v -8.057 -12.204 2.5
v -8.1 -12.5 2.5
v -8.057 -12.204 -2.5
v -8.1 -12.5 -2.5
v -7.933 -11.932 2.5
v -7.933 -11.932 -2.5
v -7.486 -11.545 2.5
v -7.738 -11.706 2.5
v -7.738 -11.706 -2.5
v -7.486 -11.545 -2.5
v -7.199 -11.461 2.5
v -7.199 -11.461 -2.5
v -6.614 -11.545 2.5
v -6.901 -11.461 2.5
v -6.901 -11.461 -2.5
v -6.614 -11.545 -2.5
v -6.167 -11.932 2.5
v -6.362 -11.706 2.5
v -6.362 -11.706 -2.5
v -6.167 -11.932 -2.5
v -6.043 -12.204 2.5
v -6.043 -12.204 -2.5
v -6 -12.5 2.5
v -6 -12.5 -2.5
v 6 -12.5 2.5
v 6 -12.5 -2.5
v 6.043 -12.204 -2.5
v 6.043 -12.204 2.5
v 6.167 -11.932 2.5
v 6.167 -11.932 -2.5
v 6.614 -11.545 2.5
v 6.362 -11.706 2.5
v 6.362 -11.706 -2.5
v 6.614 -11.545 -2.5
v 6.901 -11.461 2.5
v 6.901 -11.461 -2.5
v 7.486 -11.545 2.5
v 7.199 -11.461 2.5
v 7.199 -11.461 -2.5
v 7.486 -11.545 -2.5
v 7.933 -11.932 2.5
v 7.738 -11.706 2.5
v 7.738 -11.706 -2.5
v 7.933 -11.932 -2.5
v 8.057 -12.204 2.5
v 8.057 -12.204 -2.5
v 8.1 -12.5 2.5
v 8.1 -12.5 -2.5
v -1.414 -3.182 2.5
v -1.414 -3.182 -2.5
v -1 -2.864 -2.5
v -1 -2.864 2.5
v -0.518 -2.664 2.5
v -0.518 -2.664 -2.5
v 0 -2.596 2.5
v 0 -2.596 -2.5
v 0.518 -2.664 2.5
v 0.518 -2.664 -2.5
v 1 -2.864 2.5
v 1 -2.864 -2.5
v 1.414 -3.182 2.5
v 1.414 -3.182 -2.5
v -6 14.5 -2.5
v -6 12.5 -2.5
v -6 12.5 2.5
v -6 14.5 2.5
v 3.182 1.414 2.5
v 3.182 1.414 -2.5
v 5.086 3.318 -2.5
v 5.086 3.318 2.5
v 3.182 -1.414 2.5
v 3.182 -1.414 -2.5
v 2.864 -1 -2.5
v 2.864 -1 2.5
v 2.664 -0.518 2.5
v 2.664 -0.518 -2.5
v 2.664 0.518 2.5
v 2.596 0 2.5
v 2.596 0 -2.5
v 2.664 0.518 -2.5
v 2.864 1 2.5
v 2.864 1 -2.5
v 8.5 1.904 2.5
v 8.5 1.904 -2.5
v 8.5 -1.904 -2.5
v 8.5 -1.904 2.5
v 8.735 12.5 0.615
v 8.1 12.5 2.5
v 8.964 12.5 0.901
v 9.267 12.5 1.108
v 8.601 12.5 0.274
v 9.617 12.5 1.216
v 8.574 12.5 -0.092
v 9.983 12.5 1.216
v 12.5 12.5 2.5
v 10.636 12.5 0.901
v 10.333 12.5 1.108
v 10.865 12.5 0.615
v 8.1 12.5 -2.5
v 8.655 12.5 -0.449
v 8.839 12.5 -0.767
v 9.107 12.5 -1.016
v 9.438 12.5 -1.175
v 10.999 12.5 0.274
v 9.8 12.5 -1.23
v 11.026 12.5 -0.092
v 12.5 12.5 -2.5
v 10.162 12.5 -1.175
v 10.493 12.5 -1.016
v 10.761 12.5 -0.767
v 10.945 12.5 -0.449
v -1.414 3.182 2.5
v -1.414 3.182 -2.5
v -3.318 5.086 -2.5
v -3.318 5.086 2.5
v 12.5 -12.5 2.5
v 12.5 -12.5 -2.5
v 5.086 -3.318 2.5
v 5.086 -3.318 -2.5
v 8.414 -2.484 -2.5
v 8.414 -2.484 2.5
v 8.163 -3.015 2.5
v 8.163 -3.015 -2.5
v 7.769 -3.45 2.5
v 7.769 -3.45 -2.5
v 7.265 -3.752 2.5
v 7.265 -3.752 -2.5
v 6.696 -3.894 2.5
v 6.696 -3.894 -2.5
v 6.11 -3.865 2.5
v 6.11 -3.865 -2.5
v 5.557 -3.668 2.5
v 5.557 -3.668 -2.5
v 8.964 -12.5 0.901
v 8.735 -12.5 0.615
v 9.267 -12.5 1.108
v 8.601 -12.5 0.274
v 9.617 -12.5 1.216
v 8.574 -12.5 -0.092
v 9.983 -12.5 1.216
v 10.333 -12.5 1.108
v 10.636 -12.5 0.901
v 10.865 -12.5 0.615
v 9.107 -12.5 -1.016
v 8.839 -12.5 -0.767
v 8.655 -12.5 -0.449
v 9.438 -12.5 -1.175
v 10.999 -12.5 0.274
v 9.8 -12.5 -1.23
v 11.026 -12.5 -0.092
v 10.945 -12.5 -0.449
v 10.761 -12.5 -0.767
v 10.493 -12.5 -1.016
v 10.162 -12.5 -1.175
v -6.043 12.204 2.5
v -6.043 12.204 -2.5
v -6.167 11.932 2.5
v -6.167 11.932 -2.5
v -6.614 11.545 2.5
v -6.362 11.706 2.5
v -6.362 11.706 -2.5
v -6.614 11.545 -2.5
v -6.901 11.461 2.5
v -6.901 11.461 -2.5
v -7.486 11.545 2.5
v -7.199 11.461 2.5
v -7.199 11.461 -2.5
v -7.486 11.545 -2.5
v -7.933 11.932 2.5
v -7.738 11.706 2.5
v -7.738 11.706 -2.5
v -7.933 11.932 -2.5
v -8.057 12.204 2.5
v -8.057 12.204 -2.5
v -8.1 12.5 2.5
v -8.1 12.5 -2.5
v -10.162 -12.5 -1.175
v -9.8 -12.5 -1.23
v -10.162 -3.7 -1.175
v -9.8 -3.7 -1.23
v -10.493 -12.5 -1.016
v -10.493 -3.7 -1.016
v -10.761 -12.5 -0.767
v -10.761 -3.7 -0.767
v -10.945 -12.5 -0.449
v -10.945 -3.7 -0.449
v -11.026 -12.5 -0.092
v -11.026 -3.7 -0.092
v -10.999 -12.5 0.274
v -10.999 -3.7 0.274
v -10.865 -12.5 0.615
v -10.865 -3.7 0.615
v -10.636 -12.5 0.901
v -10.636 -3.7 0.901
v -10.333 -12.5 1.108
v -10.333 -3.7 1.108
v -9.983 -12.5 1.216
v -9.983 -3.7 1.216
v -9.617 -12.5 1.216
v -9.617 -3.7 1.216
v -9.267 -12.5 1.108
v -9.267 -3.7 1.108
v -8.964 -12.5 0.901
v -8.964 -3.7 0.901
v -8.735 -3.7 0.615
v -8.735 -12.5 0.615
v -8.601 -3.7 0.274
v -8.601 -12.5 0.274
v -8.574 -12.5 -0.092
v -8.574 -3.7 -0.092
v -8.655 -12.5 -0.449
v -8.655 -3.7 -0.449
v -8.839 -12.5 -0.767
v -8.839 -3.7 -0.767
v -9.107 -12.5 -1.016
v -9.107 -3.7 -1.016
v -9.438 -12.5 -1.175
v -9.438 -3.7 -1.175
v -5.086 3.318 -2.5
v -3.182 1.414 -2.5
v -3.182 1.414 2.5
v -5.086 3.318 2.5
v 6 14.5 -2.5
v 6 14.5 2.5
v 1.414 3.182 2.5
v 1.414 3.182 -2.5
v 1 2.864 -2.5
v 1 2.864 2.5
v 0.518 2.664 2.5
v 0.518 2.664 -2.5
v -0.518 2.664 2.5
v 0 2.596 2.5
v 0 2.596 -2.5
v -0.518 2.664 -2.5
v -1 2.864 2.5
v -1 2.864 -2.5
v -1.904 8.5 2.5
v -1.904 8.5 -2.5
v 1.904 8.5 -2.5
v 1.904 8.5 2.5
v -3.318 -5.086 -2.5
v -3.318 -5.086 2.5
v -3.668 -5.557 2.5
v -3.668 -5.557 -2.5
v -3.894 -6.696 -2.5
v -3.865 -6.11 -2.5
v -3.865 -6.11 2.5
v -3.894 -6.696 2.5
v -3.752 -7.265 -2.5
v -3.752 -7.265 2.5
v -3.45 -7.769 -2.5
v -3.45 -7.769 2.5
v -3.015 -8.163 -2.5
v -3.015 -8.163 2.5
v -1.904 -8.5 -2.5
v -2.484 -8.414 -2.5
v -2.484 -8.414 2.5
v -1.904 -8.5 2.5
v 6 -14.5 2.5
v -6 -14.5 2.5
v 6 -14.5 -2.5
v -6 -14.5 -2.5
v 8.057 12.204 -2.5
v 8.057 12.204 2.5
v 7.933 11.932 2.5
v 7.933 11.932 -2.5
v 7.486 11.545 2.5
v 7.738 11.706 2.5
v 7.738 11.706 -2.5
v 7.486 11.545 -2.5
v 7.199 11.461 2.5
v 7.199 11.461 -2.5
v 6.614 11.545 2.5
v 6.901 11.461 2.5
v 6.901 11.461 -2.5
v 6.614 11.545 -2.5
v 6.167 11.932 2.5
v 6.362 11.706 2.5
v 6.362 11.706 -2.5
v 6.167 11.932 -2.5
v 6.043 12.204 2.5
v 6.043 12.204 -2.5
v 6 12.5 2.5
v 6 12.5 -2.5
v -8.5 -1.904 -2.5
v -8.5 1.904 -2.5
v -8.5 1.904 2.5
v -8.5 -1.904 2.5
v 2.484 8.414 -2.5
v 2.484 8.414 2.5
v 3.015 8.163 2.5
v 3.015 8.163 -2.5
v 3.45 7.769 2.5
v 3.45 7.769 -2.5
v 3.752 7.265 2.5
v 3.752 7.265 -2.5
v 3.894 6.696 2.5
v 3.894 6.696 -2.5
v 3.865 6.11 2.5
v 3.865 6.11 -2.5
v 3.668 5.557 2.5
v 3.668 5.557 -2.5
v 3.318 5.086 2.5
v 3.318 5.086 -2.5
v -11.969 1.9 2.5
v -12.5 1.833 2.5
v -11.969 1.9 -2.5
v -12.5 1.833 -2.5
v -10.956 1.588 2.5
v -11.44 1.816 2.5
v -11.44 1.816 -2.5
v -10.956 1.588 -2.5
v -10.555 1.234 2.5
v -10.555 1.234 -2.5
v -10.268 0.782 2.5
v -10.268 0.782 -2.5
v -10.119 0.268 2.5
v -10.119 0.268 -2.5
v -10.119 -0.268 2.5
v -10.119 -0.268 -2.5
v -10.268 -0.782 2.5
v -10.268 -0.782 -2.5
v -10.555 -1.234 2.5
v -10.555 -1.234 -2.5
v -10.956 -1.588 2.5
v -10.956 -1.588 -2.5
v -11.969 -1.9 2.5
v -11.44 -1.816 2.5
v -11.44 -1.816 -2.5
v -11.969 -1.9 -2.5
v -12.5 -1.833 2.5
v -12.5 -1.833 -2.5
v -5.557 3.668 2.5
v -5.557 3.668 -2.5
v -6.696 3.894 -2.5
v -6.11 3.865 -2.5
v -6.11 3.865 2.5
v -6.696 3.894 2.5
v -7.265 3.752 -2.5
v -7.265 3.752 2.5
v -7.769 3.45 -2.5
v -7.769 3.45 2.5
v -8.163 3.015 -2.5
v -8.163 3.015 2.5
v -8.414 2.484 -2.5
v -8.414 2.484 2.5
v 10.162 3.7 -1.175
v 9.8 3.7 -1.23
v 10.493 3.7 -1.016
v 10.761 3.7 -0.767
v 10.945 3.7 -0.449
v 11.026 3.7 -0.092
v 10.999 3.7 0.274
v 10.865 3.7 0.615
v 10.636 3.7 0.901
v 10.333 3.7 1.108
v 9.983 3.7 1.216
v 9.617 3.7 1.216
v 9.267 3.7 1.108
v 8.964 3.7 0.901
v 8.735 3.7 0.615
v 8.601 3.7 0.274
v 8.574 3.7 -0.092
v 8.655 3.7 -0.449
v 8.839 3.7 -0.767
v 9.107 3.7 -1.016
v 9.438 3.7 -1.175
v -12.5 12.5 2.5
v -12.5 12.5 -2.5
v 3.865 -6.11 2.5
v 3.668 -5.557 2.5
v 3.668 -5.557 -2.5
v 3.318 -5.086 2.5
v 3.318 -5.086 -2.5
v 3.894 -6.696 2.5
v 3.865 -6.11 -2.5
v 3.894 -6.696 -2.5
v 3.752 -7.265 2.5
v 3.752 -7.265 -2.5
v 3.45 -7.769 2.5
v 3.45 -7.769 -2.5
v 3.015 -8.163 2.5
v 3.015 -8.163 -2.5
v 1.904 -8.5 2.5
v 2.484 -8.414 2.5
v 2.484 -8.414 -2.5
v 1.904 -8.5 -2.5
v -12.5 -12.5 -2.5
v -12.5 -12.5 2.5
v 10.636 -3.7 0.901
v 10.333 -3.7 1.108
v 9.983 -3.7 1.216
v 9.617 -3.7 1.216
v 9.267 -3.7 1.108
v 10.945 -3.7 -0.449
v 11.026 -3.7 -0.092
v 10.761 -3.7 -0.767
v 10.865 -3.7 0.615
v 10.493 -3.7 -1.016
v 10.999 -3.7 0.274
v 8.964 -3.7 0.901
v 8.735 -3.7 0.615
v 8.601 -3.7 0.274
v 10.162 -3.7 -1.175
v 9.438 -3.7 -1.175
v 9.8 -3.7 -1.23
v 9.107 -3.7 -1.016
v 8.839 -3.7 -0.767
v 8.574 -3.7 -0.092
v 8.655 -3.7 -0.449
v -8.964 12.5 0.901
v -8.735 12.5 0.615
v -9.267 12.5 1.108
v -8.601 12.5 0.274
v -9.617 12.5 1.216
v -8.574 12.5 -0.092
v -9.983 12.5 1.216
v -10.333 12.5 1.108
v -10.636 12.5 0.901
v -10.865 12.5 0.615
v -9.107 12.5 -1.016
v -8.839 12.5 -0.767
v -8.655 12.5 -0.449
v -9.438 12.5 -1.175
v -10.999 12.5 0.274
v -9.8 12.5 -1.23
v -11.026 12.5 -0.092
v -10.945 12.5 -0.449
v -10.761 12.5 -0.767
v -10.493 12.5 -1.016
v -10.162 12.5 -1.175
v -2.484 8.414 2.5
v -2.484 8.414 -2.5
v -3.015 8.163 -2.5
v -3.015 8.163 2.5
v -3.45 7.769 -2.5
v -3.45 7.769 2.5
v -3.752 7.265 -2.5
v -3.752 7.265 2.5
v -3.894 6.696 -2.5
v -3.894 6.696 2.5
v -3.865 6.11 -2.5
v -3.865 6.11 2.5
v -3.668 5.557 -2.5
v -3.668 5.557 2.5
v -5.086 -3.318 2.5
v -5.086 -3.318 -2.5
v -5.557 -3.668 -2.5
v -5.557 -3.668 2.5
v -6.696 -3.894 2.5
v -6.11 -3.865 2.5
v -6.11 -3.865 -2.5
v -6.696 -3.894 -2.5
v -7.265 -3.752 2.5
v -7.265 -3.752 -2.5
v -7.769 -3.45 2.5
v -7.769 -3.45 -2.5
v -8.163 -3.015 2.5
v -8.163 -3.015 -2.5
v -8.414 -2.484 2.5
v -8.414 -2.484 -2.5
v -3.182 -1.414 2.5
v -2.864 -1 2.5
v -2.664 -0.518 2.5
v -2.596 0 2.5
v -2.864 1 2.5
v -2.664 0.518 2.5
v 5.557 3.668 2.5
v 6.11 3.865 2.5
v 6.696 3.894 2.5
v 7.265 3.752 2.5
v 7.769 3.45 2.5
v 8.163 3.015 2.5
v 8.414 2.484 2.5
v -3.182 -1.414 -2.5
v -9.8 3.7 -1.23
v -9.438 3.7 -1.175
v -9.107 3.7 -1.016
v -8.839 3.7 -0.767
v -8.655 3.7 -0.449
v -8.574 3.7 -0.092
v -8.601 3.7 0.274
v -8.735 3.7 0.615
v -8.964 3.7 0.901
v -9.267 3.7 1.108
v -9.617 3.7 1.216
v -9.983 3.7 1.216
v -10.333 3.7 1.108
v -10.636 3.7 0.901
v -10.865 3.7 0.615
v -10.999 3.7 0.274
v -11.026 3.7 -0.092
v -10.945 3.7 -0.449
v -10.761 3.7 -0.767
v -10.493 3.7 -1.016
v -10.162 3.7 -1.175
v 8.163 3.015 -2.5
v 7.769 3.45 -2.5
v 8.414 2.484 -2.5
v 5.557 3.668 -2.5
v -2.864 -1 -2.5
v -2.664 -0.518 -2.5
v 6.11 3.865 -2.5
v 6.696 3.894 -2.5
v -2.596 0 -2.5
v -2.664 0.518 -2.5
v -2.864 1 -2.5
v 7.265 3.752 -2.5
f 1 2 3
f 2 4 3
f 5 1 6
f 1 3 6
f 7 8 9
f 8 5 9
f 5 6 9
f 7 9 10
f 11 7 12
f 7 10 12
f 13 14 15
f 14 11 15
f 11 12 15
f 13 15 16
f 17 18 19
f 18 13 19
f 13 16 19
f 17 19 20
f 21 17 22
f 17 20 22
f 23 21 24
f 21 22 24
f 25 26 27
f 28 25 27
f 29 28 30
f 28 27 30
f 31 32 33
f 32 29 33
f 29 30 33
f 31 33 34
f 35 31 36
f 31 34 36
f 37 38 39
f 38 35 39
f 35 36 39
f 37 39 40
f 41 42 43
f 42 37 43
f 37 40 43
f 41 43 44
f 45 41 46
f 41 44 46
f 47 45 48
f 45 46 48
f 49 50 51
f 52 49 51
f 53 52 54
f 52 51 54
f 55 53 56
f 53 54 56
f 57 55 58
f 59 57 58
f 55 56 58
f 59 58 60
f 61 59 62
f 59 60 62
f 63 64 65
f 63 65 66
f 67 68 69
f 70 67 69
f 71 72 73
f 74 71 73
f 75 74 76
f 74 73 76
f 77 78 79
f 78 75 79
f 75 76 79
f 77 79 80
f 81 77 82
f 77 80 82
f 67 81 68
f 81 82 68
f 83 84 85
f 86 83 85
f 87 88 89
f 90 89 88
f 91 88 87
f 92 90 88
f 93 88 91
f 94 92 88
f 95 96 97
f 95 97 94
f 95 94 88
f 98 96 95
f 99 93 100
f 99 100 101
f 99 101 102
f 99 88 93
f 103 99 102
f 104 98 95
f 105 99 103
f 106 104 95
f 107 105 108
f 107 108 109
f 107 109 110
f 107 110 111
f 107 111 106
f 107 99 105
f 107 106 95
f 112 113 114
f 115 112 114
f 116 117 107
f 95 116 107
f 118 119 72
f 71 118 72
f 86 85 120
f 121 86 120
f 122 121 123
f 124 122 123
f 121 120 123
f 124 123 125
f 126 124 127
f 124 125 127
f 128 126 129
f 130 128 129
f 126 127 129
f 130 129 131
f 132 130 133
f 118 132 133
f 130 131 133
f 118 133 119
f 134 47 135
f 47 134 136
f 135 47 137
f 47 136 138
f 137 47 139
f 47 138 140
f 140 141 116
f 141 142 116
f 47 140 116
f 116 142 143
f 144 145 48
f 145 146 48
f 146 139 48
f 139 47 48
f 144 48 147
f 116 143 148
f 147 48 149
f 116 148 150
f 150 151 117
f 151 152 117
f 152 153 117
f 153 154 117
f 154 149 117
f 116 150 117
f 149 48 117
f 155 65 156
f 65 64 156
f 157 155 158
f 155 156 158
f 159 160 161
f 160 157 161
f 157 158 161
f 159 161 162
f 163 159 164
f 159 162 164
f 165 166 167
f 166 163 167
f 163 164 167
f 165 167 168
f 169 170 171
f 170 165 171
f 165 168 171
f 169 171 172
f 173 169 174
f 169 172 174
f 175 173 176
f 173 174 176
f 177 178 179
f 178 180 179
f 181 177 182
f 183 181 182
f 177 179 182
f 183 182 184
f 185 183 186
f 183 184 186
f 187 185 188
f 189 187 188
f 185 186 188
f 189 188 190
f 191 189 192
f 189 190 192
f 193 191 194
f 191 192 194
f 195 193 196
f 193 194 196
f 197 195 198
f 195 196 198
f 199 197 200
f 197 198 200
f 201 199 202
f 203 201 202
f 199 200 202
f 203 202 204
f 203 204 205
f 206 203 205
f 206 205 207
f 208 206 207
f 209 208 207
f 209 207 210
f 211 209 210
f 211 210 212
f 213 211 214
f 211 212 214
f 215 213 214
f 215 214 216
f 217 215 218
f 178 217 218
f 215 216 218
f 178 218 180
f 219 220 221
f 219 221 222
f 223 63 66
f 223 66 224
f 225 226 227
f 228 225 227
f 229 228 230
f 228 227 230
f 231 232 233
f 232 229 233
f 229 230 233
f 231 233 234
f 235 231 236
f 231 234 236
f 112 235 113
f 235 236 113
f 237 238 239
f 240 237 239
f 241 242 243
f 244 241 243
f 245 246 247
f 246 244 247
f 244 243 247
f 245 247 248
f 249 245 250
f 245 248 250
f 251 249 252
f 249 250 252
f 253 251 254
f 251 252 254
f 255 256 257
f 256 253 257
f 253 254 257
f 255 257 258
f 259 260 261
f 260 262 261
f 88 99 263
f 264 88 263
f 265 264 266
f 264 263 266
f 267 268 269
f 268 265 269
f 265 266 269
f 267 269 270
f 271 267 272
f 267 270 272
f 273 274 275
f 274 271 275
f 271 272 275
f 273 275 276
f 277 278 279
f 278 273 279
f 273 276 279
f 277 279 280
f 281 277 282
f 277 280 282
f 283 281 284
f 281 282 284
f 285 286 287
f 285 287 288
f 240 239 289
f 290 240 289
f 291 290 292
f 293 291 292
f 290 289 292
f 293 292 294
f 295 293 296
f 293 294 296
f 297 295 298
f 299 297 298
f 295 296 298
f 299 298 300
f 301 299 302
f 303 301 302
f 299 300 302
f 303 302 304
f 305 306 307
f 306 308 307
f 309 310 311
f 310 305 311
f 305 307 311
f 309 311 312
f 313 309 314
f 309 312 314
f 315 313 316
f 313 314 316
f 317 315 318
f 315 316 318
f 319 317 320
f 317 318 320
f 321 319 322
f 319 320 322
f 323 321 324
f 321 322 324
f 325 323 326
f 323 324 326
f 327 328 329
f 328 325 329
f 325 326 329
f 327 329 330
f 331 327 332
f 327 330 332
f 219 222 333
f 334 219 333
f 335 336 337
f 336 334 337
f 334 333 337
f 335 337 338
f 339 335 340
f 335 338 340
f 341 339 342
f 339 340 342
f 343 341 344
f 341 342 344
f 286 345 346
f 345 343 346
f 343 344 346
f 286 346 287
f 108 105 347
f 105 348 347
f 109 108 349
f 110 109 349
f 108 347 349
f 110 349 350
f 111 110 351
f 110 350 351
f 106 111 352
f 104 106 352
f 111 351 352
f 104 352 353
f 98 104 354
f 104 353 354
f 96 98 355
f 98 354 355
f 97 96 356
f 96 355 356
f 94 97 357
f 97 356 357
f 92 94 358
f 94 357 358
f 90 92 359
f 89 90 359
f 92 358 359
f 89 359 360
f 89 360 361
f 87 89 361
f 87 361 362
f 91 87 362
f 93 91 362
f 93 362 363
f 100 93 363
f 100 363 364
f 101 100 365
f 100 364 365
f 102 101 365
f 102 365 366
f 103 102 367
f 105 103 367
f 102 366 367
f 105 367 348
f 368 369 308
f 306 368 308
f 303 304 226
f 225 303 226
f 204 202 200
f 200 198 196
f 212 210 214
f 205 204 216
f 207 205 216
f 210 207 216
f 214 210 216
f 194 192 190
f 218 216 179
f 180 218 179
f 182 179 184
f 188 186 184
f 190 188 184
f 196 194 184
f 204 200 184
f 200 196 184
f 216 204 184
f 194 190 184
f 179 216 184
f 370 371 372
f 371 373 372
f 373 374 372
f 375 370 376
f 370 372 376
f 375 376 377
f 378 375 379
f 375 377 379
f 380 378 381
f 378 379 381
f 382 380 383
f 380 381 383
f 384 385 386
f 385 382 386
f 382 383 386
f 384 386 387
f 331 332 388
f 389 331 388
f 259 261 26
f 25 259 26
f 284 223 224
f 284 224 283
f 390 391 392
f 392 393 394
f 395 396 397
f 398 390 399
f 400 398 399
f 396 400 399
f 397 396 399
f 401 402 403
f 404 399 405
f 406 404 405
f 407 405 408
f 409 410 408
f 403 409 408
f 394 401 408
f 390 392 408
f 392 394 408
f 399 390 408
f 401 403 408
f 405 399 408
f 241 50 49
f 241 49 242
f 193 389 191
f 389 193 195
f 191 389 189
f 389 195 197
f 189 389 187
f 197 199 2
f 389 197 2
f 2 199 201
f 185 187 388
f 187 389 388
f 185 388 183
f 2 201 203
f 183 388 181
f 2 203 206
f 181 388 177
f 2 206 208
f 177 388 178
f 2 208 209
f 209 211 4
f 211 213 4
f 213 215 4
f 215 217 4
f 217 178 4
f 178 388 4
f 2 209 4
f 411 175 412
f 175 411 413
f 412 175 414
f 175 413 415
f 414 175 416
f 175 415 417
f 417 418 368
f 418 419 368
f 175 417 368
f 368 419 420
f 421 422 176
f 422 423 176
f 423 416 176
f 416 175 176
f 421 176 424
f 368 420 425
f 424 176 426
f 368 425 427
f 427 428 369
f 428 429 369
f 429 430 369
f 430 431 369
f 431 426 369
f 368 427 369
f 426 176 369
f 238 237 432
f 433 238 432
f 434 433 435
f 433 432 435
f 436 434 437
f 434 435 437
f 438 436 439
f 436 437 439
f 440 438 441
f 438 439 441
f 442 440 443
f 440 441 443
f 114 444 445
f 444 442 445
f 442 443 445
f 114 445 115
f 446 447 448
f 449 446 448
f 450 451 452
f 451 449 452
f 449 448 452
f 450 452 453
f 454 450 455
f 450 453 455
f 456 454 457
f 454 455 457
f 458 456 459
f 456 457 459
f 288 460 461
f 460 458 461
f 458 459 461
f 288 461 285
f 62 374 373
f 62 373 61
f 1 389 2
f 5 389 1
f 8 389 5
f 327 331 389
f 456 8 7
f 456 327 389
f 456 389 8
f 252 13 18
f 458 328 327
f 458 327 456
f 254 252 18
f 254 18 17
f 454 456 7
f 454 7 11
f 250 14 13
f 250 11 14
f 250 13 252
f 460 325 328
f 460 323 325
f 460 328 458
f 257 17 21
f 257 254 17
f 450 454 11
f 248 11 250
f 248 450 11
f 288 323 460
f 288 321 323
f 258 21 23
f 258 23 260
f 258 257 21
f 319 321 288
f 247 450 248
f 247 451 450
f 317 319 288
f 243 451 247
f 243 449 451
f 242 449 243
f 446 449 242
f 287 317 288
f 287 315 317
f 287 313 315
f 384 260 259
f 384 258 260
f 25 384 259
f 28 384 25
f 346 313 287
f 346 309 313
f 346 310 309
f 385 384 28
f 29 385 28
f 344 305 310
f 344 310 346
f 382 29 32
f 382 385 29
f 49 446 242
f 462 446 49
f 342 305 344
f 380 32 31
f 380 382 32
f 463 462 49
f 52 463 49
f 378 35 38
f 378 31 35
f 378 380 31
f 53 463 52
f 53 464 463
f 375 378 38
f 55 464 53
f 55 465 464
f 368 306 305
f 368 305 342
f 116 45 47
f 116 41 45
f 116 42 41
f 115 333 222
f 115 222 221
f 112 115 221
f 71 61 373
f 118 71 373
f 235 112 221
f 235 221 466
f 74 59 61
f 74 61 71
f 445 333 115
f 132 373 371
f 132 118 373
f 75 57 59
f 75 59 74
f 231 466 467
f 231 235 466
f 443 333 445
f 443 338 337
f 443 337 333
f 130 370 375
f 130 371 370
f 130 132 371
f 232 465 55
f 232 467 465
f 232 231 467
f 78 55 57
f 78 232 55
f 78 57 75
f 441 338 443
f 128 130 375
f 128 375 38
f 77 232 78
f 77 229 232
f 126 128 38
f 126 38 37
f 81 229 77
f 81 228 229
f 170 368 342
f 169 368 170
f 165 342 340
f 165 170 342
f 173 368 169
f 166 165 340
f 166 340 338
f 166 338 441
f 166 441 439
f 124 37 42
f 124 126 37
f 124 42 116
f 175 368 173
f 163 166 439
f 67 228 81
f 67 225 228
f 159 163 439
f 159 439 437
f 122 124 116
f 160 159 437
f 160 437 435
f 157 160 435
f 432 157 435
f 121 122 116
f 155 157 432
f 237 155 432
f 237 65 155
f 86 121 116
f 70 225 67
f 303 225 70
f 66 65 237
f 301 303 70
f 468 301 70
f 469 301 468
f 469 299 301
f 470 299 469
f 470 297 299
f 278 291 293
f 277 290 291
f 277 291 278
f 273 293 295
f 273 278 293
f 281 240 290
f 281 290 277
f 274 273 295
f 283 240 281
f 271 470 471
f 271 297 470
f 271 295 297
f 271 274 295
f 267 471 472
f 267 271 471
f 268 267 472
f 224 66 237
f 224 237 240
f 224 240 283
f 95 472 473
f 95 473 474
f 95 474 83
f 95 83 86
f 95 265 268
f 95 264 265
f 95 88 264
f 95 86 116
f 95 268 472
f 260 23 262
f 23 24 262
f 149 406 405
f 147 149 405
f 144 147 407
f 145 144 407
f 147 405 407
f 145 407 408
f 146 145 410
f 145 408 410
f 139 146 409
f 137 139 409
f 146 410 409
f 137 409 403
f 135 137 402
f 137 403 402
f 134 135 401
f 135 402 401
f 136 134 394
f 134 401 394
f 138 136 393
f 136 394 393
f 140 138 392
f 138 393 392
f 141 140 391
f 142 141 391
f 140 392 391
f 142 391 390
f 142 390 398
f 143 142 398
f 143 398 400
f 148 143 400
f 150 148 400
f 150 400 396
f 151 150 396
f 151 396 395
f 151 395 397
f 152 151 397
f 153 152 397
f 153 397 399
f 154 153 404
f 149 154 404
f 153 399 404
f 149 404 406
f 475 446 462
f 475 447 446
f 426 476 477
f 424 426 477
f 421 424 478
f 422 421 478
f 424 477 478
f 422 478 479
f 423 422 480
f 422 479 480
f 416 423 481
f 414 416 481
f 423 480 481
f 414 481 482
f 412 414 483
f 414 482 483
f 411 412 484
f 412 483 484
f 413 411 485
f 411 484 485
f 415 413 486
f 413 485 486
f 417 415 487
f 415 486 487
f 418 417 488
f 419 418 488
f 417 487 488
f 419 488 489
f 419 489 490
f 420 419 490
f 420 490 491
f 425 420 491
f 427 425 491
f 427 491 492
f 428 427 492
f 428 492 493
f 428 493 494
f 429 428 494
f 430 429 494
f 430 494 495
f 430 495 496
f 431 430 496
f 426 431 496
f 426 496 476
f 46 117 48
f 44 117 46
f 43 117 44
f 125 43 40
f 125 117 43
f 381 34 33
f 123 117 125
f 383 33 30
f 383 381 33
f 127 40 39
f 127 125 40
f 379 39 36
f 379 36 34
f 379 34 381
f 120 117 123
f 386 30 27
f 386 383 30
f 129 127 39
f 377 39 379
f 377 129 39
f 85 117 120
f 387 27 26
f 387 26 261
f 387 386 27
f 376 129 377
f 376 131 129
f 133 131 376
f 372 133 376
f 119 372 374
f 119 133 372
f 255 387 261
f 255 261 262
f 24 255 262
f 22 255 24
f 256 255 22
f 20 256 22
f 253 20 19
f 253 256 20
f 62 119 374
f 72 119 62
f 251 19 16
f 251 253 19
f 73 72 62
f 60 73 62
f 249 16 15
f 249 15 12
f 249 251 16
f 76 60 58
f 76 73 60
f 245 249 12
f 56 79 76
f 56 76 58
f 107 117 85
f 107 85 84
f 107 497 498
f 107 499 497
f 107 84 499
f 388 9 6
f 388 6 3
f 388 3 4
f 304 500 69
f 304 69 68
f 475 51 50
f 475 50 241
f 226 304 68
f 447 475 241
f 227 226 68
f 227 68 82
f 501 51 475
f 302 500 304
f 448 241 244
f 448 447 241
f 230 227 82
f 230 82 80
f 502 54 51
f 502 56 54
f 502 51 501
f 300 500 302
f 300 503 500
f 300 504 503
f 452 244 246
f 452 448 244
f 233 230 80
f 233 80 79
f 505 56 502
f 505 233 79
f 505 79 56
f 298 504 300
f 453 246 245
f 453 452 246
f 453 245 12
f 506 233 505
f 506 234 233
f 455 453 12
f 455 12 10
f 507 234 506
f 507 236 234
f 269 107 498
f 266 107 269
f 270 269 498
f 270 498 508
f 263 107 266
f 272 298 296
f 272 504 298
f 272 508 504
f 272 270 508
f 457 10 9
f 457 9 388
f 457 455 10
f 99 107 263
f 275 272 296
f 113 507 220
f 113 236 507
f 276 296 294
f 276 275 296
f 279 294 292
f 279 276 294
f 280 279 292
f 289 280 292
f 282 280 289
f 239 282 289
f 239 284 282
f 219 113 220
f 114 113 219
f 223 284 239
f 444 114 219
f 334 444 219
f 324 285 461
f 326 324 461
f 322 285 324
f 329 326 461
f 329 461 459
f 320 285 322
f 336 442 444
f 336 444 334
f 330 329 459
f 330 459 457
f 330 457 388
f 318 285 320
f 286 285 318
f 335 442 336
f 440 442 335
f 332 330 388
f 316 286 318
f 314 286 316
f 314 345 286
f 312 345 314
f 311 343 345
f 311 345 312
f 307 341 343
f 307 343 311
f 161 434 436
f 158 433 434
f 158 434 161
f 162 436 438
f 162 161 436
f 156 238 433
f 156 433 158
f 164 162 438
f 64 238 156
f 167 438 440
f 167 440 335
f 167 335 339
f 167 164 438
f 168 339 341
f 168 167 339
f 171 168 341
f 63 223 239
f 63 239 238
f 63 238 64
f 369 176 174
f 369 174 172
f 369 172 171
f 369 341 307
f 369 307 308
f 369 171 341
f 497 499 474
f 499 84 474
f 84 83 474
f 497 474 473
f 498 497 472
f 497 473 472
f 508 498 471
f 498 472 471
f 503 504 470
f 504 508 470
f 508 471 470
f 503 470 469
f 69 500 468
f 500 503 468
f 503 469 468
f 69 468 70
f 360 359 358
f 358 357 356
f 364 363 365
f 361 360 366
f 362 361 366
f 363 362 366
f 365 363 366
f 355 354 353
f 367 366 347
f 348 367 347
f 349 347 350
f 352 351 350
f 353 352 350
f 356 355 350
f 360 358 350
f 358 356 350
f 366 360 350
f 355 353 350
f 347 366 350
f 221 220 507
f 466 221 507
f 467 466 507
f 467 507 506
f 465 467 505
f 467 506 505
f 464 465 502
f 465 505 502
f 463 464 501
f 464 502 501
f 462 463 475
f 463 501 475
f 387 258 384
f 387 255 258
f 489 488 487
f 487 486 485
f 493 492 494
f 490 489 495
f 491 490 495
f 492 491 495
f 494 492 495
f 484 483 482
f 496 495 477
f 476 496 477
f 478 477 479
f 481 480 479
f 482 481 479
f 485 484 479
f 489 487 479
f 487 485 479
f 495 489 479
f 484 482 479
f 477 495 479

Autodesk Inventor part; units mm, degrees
ref_plane "YZ Plane" through (0, 0, 0) normal (1, 0, 0) x (0, 1, 0)
ref_plane "XZ Plane" through (0, 0, 0) normal (0, 1, 0) x (-1, 0, 0)
ref_plane "XY Plane" through (0, 0, 0) normal (0, 0, 1) x (1, 0, 0)
sketch "スケッチ1" plane through (0, 0, 0) normal (0, 0, 1) x (1, 0, 0)
  line L0 (-12.5, -12.5) -> (12.5, -12.5) construction
  line L1 (12.5, -12.5) -> (12.5, 12.5)
  line L2 (12.5, 12.5) -> (-12.5, 12.5) construction
  line L3 (-12.5, 12.5) -> (-12.5, -12.5)
  line L4 (-12.5, -12.5) -> (12.5, 12.5) construction
  line L5 (12.5, -12.5) -> (-12.5, 12.5) construction
  line L6 (-8.1, 12.5) -> (-12.5, 12.5)
  line L7 (8.1, 12.5) -> (12.5, 12.5)
  line L8 (-12.5, -12.5) -> (-8.1, -12.5)
  line L9 (8.1, -12.5) -> (12.5, -12.5)
  line L10 (-6, 12.5) -> (-6, 14.5)
  line L11 (-6, 14.5) -> (6, 14.5)
  line L12 (6, 14.5) -> (6, 12.5)
  arc A0 (-8.1, 12.5) -> (-6, 12.5) centre (-7.05, 12.5) ccw
  arc A1 (6, 12.5) -> (8.1, 12.5) centre (7.05, 12.5) ccw
  line L13 (0, 12.5) -> (0, 0) construction
  line L14 (0, 0) -> (12.5, 0) construction
  line L15 (-6, -12.5) -> (-6, -14.5)
  line L16 (-6, -14.5) -> (6, -14.5)
  line L17 (6, -14.5) -> (6, -12.5)
  arc A2 (-6, -12.5) -> (-8.1, -12.5) centre (-7.05, -12.5) ccw
  arc A3 (8.1, -12.5) -> (6, -12.5) centre (7.05, -12.5) ccw
  line L18 (-9.05, 12.5) -> (-5.95, 12.5) construction
  line L19 (-6.7322, 8.5) -> (6.7322, 8.5)
  line L20 (6.7322, 8.5) -> (0, 1.7678)
  line L21 (0, 1.7678) -> (-6.7322, 8.5)
  line L22 (-8.5, 6.7322) -> (-8.5, -6.7322)
  line L23 (-8.5, -6.7322) -> (-1.7678, 0)
  line L24 (-1.7678, 0) -> (-8.5, 6.7322)
  line L25 (-6.7322, -8.5) -> (6.7322, -8.5)
  line L26 (6.7322, -8.5) -> (0, -1.7678)
  line L27 (0, -1.7678) -> (-6.7322, -8.5)
  line L28 (8.5, 6.7322) -> (8.5, -6.7322)
  line L29 (8.5, -6.7322) -> (1.7678, 0)
  line L30 (1.7678, 0) -> (8.5, 6.7322)
  line L31 (12.5, 0) -> (12.3, 0)
  arc A4 (-12.5, -1.833) -> (-12.5, 1.833) centre (-12, 0) ccw
  point P0 (-12.5, 0)
  dimension "d0" = 25
  dimension "d1" = 1.05
  dimension "d2" = 2
  dimension "d3" = 6.5
  dimension "d9" = 2.5
  dimension "d10" = 2.5
  dimension "d11" = 2.5
  dimension "d12" = 2.5
  dimension "d13" = 4
  dimension "d31" = 25
  dimension "d44" = 1.9
  dimension "d46" = 0.5
extrude "押し出し1" add sketch "スケッチ1" along normal blind 2.5 contours L9 A3 L17 L16 L15 A2 L8 L3 A4 L6 A0 L10 L11 L12 A1 L7 L1
mirror "ミラー1" about plane through (0, 0, 0) normal (0, 0, -1) of "押し出し1"
sketch "スケッチ2" plane through (-12.5, -12.5, 2.5) normal (0, -1, 0) x (1, 0, 0)
  line L0 (6.5, 0) -> (18.5, 0) construction
  line L1 (12.5, 0) -> (12.5, -5) construction
  line L2 (0, -5) -> (4.4, -5) projected
  line L3 (20.6, -5) -> (25, -5) projected
  line L4 (0, -5) -> (0, 0) projected
  line L5 (25, -5) -> (25, 0) projected
  point P0 (12.5, -2.5)
  point P1 (2.7, -2.5)
  point P2 (22.3, -2.5)
  dimension "d35" = 2.5
  dimension "d37" = 2.5
  dimension "d47" = 2.7
  dimension "d48" = 2.7
hole "穴1" at (-9.8, -12.5, 0) at (9.8, -12.5, 0) direction (0, 1, 0) diameter 2.459 depth 8.8 thread size "M3x0.5" class "6H" standard "ISO Metric profile"
pattern_circular "円形状パターン1" count 2 over 360 about axis through (0, 0, -10) along (0, 0, 1) of "穴1"
fillet "フィレット1" radius 2 12 edges at (8.5, 6.7322, 0) (8.5, -6.7322, 0) (6.7322, -8.5, 0) (0, 1.7678, 0) (-1.7678, 0, 0) (-6.7322, -8.5, 0) (-8.5, -6.7322, 0) (6.7322, 8.5, 0) (-8.5, 6.7322, 0) (-6.7322, 8.5, 0) (0, -1.7678, 0) (1.7678, 0, 0)
equation "\"d10\" = d9"
equation "\"d11\" = d10"
equation "\"d12\" = d11"
properties part number "Head_diagonal" material "アセタール樹脂、黒"
